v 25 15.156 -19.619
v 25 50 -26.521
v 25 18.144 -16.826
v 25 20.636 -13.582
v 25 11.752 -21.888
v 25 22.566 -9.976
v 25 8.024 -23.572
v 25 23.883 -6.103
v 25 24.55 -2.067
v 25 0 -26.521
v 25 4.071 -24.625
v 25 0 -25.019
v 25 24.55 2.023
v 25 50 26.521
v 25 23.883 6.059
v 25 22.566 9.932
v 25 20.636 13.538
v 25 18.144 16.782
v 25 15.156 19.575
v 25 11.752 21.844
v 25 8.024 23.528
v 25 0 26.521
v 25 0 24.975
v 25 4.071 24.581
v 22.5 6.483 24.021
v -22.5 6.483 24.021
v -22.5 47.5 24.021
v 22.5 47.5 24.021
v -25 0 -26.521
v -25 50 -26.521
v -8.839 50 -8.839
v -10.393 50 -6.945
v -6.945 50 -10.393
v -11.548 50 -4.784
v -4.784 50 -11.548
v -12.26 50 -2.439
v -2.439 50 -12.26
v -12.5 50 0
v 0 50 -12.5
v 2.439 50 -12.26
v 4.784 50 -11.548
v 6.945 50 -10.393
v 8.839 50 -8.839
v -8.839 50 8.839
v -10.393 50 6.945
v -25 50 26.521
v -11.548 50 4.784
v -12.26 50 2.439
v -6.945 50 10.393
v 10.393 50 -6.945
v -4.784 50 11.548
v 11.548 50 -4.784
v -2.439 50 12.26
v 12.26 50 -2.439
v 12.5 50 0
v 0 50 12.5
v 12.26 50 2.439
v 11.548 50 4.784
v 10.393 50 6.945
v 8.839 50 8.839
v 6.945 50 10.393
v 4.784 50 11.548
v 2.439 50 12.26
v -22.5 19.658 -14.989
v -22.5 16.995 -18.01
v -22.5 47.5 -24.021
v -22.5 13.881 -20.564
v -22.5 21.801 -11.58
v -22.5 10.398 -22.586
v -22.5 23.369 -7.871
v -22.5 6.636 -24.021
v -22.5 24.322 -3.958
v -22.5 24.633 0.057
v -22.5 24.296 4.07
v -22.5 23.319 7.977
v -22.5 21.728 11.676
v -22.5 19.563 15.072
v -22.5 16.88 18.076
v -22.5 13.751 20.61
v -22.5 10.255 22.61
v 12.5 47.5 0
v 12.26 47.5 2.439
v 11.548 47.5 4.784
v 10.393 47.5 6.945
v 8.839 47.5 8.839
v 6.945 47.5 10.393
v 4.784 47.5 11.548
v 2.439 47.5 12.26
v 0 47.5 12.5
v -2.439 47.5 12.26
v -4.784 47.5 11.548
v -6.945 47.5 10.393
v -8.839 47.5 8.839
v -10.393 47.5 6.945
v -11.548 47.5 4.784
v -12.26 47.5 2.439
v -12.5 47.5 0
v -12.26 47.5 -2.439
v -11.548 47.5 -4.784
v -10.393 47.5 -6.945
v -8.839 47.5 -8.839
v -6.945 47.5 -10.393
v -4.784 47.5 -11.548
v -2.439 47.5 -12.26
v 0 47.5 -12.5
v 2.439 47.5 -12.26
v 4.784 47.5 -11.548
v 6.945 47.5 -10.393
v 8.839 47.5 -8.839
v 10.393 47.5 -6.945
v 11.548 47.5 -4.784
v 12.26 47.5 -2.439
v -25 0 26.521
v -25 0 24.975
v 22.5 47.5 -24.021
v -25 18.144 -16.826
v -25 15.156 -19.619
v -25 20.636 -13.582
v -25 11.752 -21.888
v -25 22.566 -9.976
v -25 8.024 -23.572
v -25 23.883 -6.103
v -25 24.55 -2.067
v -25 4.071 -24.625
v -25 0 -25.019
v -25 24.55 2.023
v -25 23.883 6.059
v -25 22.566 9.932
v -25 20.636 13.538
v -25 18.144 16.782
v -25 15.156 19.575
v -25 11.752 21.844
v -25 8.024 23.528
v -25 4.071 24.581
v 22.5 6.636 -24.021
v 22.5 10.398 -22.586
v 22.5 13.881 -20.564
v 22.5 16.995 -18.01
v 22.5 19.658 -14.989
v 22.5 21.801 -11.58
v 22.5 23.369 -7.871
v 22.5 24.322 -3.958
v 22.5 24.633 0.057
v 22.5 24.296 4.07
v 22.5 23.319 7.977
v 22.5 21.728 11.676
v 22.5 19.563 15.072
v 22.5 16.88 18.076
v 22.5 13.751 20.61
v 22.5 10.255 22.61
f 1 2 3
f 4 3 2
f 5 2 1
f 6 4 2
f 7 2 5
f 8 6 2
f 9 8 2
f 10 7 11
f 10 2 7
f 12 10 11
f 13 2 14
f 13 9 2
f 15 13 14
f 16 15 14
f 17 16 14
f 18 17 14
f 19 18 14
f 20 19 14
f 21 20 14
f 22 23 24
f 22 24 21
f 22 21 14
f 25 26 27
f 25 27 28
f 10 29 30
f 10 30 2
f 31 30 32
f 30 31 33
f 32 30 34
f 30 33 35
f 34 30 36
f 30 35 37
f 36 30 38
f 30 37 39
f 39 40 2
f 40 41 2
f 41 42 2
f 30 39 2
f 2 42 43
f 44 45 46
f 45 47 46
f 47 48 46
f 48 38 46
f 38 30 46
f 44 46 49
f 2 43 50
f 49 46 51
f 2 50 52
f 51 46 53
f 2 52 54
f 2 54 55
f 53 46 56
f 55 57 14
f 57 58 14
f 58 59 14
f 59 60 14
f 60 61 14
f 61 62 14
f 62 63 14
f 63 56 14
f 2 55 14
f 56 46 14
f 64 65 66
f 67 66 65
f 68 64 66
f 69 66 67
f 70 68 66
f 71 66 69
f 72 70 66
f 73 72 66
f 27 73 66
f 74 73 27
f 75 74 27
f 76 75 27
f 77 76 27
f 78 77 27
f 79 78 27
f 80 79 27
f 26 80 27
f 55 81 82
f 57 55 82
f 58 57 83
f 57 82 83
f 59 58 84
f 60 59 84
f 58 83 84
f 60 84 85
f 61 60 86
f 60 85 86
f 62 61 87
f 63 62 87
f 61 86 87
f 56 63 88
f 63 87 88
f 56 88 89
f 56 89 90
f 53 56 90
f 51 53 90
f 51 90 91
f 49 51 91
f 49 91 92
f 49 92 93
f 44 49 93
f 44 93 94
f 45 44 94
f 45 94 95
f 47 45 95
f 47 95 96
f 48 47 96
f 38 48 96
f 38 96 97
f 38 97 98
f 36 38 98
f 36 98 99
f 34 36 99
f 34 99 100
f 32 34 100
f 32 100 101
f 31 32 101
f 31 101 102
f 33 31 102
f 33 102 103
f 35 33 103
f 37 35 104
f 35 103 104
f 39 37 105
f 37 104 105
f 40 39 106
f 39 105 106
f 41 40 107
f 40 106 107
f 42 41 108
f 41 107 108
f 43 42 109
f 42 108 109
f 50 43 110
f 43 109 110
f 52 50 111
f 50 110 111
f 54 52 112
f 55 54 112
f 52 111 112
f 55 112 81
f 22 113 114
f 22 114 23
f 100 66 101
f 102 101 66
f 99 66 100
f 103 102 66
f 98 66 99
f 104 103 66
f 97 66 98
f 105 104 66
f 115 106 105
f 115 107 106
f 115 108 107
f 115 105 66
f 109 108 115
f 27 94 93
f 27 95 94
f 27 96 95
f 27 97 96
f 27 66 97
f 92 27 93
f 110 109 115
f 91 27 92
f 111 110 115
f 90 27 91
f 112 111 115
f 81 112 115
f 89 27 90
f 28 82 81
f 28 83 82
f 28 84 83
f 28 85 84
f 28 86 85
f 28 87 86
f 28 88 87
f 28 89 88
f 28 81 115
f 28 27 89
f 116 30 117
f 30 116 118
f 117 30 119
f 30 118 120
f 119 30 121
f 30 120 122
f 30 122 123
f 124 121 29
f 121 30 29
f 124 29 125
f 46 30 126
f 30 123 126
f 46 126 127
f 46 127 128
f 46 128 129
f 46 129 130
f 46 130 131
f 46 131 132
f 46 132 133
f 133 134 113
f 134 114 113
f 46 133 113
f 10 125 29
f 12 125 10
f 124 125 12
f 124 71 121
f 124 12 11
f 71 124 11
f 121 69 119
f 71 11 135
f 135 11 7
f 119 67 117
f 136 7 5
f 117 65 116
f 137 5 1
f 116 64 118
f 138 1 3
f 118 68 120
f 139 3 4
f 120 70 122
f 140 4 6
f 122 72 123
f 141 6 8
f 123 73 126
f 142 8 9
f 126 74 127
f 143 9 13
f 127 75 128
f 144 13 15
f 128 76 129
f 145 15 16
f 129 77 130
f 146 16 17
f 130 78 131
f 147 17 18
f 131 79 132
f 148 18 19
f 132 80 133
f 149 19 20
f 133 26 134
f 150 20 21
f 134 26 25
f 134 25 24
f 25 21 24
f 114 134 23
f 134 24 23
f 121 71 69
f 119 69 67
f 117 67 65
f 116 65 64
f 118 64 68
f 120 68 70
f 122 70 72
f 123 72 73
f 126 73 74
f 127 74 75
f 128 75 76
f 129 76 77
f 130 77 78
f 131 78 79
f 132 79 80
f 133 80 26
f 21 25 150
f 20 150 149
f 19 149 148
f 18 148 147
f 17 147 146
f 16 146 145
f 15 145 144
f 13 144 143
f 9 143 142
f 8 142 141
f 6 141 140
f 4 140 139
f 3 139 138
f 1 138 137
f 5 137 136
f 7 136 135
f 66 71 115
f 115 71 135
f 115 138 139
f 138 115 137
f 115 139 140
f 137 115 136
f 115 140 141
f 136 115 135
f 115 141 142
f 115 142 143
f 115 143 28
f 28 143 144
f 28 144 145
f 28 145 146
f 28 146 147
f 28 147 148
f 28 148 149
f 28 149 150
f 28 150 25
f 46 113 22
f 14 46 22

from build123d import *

# Parameters (mm, degrees)
F0_W     = 50
F0_H     = 53.0426052851
F1_DEPTH = 50
F2_R     = 25
F3_DEPTH = 25
F4_DEPTH = 25
F5_T     = 2.5
F6_R     = 12.5
F7_DEPTH = 50


# Not quite as in the source:
# - a shell that OpenCascade refuses in one call is made with other operations: the cavity is built on its own and cut out


with BuildPart() as f1:
    # F0 (on Front) → F1 (new body)
    with BuildSketch(Plane.XZ):
        Rectangle(F0_W, F0_H)
    extrude(amount=-F1_DEPTH)

    # F2 (on Right) → F3 (cut)
    with BuildSketch(Plane.YZ):
        with Locations((-0.3665760159, -0.021956861)):
            Circle(F2_R)
    extrude(amount=F3_DEPTH, mode=Mode.SUBTRACT)

    # F2 (on Right) → F4 (cut)
    with BuildSketch(Plane.YZ):
        with Locations((-0.3665760159, -0.021956861)):
            Circle(F2_R)
    extrude(amount=-F4_DEPTH, mode=Mode.SUBTRACT)

    # F5: shell of thickness 2.5, made by hand


with BuildPart() as f5_core1:
    # F5_t2: copy of F1
    add(f1.part)

    # the walls: a layer under each face that stays
    f5_faces = [f5_core1.faces().sort_by_distance(p)[0] for p in [
        (-25, 25, 0),
        (25, 25, 0),
        (0, 0, -25.7702858998),
        (0, 25, -26.5213026426),
        (0, 50, 0),
        (0, 25, 26.5213026426),
        (0, 0, 25.7483290388),
    ]]
    thicken(f5_faces, amount=-F5_T, mode=Mode.SUBTRACT)


with BuildPart() as f1_1:
    add(f1.part)

    # what is left inside the walls is the cavity
    f5_cavity = [f5_core1.part.solids().sort_by_distance(p)[0] for p in [
        (-7.5, 24.658298, 0.057376),
    ]]
    add(f5_cavity, mode=Mode.SUBTRACT)

    # F6 (on Front) → F7 (cut)
    with BuildSketch(Plane.XZ):
        Circle(F6_R)
    extrude(amount=-F7_DEPTH, mode=Mode.SUBTRACT)


solid = f1_1.part
